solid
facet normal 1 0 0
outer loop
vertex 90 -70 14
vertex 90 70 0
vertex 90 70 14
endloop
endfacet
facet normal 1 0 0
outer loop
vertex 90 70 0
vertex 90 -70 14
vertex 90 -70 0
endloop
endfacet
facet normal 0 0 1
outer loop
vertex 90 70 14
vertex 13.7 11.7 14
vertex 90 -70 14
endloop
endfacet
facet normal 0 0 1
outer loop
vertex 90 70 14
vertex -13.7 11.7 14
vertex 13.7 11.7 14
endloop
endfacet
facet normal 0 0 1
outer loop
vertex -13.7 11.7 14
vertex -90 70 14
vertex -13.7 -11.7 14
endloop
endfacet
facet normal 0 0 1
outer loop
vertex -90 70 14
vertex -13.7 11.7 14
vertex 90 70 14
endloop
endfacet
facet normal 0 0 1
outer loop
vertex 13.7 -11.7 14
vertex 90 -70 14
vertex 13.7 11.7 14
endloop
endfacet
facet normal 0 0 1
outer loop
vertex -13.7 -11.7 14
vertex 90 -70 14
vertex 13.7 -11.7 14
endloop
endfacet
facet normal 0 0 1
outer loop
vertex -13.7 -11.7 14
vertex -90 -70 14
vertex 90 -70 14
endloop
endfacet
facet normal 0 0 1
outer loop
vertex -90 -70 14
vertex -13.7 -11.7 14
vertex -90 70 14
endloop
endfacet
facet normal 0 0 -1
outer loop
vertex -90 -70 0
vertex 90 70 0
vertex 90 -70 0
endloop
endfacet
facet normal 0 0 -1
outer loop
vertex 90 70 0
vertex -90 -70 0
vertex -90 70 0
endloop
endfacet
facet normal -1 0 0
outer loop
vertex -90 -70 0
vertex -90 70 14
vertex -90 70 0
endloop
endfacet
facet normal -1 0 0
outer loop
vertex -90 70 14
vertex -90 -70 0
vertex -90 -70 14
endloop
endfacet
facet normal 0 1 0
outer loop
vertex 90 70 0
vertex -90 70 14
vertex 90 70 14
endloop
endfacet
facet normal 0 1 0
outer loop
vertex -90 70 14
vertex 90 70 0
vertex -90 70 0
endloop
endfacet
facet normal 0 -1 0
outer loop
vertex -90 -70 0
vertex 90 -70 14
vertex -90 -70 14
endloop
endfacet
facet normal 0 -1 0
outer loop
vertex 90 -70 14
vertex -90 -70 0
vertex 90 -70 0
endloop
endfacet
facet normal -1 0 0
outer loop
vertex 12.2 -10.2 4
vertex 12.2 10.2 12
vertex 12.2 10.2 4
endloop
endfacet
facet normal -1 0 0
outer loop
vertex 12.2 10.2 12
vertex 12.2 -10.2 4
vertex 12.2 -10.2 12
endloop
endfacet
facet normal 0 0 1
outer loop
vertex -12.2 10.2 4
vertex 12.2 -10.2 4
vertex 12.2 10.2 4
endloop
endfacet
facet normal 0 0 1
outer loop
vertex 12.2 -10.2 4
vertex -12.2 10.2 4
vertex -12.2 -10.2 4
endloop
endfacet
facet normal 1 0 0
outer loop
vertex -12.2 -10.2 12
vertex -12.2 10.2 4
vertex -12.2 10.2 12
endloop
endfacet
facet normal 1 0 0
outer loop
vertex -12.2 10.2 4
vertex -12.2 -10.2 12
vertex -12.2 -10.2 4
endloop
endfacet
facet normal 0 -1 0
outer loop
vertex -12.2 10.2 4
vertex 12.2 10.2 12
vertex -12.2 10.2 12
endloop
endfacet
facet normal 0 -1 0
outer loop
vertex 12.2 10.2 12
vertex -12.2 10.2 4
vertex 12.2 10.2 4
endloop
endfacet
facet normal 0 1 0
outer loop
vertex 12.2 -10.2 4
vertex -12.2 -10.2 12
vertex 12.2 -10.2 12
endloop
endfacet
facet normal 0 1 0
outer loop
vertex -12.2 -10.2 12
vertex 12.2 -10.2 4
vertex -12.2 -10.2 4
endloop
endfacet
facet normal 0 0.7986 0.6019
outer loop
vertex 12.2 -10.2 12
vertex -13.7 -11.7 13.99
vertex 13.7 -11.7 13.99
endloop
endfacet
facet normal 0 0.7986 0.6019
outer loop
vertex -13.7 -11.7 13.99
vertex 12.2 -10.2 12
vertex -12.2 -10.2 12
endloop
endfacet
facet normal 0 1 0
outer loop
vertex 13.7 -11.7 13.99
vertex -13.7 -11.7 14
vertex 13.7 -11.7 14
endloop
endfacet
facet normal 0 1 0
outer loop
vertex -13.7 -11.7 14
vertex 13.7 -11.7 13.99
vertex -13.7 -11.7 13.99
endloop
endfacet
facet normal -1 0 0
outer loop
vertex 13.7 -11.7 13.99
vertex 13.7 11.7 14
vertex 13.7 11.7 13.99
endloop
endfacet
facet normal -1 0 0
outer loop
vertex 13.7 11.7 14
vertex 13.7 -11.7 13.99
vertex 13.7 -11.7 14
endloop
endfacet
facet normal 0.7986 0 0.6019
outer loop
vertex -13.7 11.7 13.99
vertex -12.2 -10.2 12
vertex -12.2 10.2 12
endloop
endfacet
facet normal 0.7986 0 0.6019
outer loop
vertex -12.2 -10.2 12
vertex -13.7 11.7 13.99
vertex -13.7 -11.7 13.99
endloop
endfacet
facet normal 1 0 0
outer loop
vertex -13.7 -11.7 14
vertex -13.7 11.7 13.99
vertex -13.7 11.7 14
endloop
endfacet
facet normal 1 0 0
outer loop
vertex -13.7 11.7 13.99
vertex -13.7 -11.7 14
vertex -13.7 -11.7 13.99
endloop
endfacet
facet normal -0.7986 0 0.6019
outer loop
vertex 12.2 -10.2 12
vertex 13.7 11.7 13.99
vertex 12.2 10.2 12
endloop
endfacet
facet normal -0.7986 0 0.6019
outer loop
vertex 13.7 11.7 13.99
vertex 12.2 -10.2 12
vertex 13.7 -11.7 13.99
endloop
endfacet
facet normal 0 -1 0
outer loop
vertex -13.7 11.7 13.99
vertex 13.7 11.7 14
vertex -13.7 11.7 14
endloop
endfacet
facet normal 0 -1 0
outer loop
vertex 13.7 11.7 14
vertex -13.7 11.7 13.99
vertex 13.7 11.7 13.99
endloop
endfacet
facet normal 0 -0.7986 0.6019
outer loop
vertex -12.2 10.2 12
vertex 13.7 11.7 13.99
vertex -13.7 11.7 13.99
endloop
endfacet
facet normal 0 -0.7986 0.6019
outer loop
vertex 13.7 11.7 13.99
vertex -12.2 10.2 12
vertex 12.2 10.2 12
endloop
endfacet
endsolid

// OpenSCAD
// Headphone stand: base, post, hanger. Units mm. Print orientation = export orientation (+Z up).
part = "base"; // [base, post, hanger, assembly]
cadverify_only = "";

/* Parameters */
base_L = 180; base_W = 140; base_H = 14;
base_sock_L = 24.4; base_sock_W = 20.4; base_sock_D = 10; // depth from top
base_floor = base_H - base_sock_D; // 4
base_cham_H = 2; base_cham_extra = 1.5; // per side funnel

post_low_L = 24; post_low_W = 20; post_low_H = 10;
post_flare_H = 6;
post_shaft_L = 34; post_shaft_W = 28;
post_shaft_bot = post_low_H + post_flare_H; // 16
post_shaft_top = 230;
post_shaft_H = post_shaft_top - post_shaft_bot; // 214
post_up_L = 20; post_up_W = 16; post_up_H = 12;
post_up_cham_H = 1.5; post_up_cham_extra = 1.5; // per side taper at top
post_H = post_shaft_top + post_up_H; // 242

hanger_L = 120; hanger_W = 36; hanger_base_H = 14; hanger_R = 18; // half-cyl radius = W/2
hanger_cyl_H = 18; // cylinder peak 14+18=32
lip_L = 10; lip_W = 36; lip_bot = 14; lip_top = 36; // end stops 14..36
hanger_H = 36;
hanger_sock_L = 20.4; hanger_sock_W = 16.4; hanger_sock_D = 12; // straight depth from bottom
hanger_roof_H = 10; // triangular roof above straight, ridge along X
hanger_cham_H = 2; hanger_cham_extra = 1.5;

asm_post_Z = base_floor; // 4, post bottom in assembly
asm_hanger_Z = 234; // hanger bottom in assembly
// shaft top 230 + post bottom 4 = 234 = hanger bottom; tenon 230..242 -> hanger 0..12; hanger top 234+36=270

module instance(name, part, unit = 1) {
    echo(cadverify_instance = [name, part, unit]);
    if (cadverify_only == "" || cadverify_only == name) children();
}

module base_part() {
    difference() {
        translate([-base_L/2, -base_W/2, 0]) cube([base_L, base_W, base_H]);
        // straight socket
        translate([-base_sock_L/2, -base_sock_W/2, base_floor])
            cube([base_sock_L, base_sock_W, base_sock_D+0.01]);
        // entry funnel (frustum widening upward)
        hull() {
            translate([-base_sock_L/2, -base_sock_W/2, base_H-base_cham_H])
                cube([base_sock_L, base_sock_W, 0.01]);
            translate([-(base_sock_L/2+base_cham_extra), -(base_sock_W/2+base_cham_extra), base_H-0.01])
                cube([base_sock_L+2*base_cham_extra, base_sock_W+2*base_cham_extra, 0.01]);
        }
    }
}

module post_part() {
    // lower tenon (press fit into base)
    translate([-post_low_L/2, -post_low_W/2, 0]) cube([post_low_L, post_low_W, post_low_H]);
    // flare collar 45deg-compatible transition to shaft
    hull() {
        translate([-post_low_L/2, -post_low_W/2, post_low_H-0.01])
            cube([post_low_L, post_low_W, 0.01]);
        translate([-post_shaft_L/2, -post_shaft_W/2, post_shaft_bot-0.01])
            cube([post_shaft_L, post_shaft_W, 0.01]);
    }
    // shaft
    translate([-post_shaft_L/2, -post_shaft_W/2, post_shaft_bot])
        cube([post_shaft_L, post_shaft_W, post_shaft_H]);
    // upper tenon straight part
    translate([-post_up_L/2, -post_up_W/2, post_shaft_top])
        cube([post_up_L, post_up_W, post_up_H-post_up_cham_H]);
    // upper tenon lead chamfer (tapers inward going up)
    hull() {
        translate([-post_up_L/2, -post_up_W/2, post_H-post_up_cham_H-0.01])
            cube([post_up_L, post_up_W, 0.01]);
        translate([-(post_up_L/2-post_up_cham_extra), -(post_up_W/2-post_up_cham_extra), post_H-0.01])
            cube([post_up_L-2*post_up_cham_extra, post_up_W-2*post_up_cham_extra, 0.01]);
    }
}

module hanger_part() {
    difference() {
        union() {
            // base box
            translate([-hanger_L/2, -hanger_W/2, 0]) cube([hanger_L, hanger_W, hanger_base_H]);
            // rounded top: half cylinder along X
            intersection() {
                translate([0, 0, hanger_base_H]) rotate([0, 90, 0])
                    cylinder(r=hanger_R, h=hanger_L, center=true, $fn=128);
                translate([-hanger_L/2, -hanger_W/2, hanger_base_H]) cube([hanger_L, hanger_W, hanger_cyl_H]);
            }
            // end stops (full height from base top, no floating ledge)
            for (sx=[-1,1])
                translate([sx*(hanger_L/2-lip_L), -lip_W/2, lip_bot])
                    cube([lip_L, lip_W, lip_top-lip_bot]);
        }
        // straight socket
        translate([-hanger_sock_L/2, -hanger_sock_W/2, 0])
            cube([hanger_sock_L, hanger_sock_W, hanger_sock_D]);
        // entry funnel at mouth (widens downward)
        hull() {
            translate([-hanger_sock_L/2, -hanger_sock_W/2, hanger_cham_H])
                cube([hanger_sock_L, hanger_sock_W, 0.01]);
            translate([-(hanger_sock_L/2+hanger_cham_extra), -(hanger_sock_W/2+hanger_cham_extra), -0.01])
                cube([hanger_sock_L+2*hanger_cham_extra, hanger_sock_W+2*hanger_cham_extra, 0.01]);
        }
        // pointed roof above straight (ridge along X), self-supporting slopes
        // closed wedge: sharp apex edge, no flat -> no overhang patch
        polyhedron(
            points = [
                [-hanger_sock_L/2, -hanger_sock_W/2, hanger_sock_D-0.1],
                [ hanger_sock_L/2, -hanger_sock_W/2, hanger_sock_D-0.1],
                [ hanger_sock_L/2,  hanger_sock_W/2, hanger_sock_D-0.1],
                [-hanger_sock_L/2,  hanger_sock_W/2, hanger_sock_D-0.1],
                [-hanger_sock_L/2, 0, hanger_sock_D+hanger_roof_H],
                [ hanger_sock_L/2, 0, hanger_sock_D+hanger_roof_H]
            ],
            faces = [
                [0, 3, 2, 1],
                [0, 1, 5, 4],
                [2, 3, 4, 5],
                [0, 4, 3],
                [1, 2, 5]
            ]
        );
    }
}

// --- specs (print coords) ---
if (part == "base") {
    echo(cadverify_spec = [
        ["bounds", [[-base_L/2, -base_W/2, 0], [base_L/2, base_W/2, base_H]]],
        ["bodies", 1],
        ["through_holes", 0],
        ["support_faces", [["base_bottom", "-z", 20000]]],
        ["overhangs_allowed", []],
        ["copies", 1],
        ["details", [
            ["base_plate", "material", [[50, 40, 0], [80, 60, base_H]], 0.9],
            ["socket", "void", [[-base_sock_L/2, -base_sock_W/2, base_floor], [base_sock_L/2, base_sock_W/2, base_H]], 0.9],
            ["socket_funnel", "void", [[-(base_sock_L/2+base_cham_extra), -(base_sock_W/2+base_cham_extra), base_H-base_cham_H], [base_sock_L/2+base_cham_extra, base_sock_W/2+base_cham_extra, base_H]], 0.7],
            ["floor", "thickness", [0, 0, -1], [0, 0, 1], base_floor],
            ["top_face", "view", [[-60, -50, base_H-1], [60, 50, base_H+1]]]
        ]]
    ]);
    base_part();
} else if (part == "post") {
    echo(cadverify_spec = [
        ["bounds", [[-post_shaft_L/2, -post_shaft_W/2, 0], [post_shaft_L/2, post_shaft_W/2, post_H]]],
        ["bodies", 1],
        ["through_holes", 0],
        ["support_faces", [["post_bottom", "-z", 400]]],
        ["overhangs_allowed", []],
        ["copies", 1],
        ["details", [
            ["shaft", "material", [[-10, -8, 60], [10, 8, 160]], 0.9],
            ["lower_tenon", "material", [[-post_low_L/2, -post_low_W/2, 0], [post_low_L/2, post_low_W/2, post_low_H]], 0.9],
            ["upper_tenon", "material", [[-post_up_L/2, -post_up_W/2, post_shaft_top], [post_up_L/2, post_up_W/2, post_H]], 0.8],
            ["collar", "material", [[-14, -12, post_low_H], [14, 12, post_shaft_bot]], 0.7],
            ["shaft_wall", "thickness", [30, 0, 116], [-1, 0, 0], post_shaft_L],
            ["tenon_tip", "view", [[-post_up_L/2, -post_up_W/2, post_H-4], [post_up_L/2, post_up_W/2, post_H+1]]]
        ]]
    ]);
    post_part();
} else if (part == "hanger") {
    echo(cadverify_spec = [
        ["bounds", [[-hanger_L/2, -hanger_W/2, 0], [hanger_L/2, hanger_W/2, hanger_H]]],
        ["bodies", 1],
        ["through_holes", 0],
        ["support_faces", [["hanger_bottom", "-z", 3000]]],
        ["overhangs_allowed", []],
        ["copies", 1],
        ["details", [
            ["saddle", "material", [[-40, -8, 20], [40, 8, 26]], 0.9],
            ["end_stop", "material", [[hanger_L/2-lip_L, -lip_W/2, lip_bot], [hanger_L/2, lip_W/2, lip_top]], 0.9],
            ["socket", "void", [[-hanger_sock_L/2, -hanger_sock_W/2, 0], [hanger_sock_L/2, hanger_sock_W/2, hanger_sock_D]], 0.9],
            ["socket_funnel", "void", [[-(hanger_sock_L/2+hanger_cham_extra), -(hanger_sock_W/2+hanger_cham_extra), 0], [hanger_sock_L/2+hanger_cham_extra, hanger_sock_W/2+hanger_cham_extra, hanger_cham_H]], 0.7],
            ["top_skin", "thickness", [0, 0, hanger_H+4], [0, 0, -1], (hanger_base_H+hanger_cyl_H)-(hanger_sock_D+hanger_roof_H)],
            ["round_top", "view", [[-40, -hanger_W/2, hanger_base_H], [40, hanger_W/2, hanger_base_H+hanger_cyl_H+1]]]
        ]]
    ]);
    hanger_part();
} else if (part == "assembly") {
    echo(cadverify_spec = [
        ["bounds", [[-base_L/2, -base_W/2, 0], [base_L/2, base_W/2, asm_hanger_Z+hanger_H]]],
        ["support_faces", [["desk", "-z", 20000]]],
        ["allowed_interferences", []],
        ["motions", []],
        ["assembly_order", [
            [[ "base_inst" ], [0, 0, 0]],
            [[ "post_inst" ], [0, 0, -1]],
            [[ "hanger_inst" ], [0, 0, -1]]
        ]],
        ["overhangs_allowed", []]
    ]);
    instance("base_inst", "base") base_part();
    instance("post_inst", "post") translate([0, 0, asm_post_Z]) post_part();
    instance("hanger_inst", "hanger") translate([0, 0, asm_hanger_Z]) hanger_part();
}
